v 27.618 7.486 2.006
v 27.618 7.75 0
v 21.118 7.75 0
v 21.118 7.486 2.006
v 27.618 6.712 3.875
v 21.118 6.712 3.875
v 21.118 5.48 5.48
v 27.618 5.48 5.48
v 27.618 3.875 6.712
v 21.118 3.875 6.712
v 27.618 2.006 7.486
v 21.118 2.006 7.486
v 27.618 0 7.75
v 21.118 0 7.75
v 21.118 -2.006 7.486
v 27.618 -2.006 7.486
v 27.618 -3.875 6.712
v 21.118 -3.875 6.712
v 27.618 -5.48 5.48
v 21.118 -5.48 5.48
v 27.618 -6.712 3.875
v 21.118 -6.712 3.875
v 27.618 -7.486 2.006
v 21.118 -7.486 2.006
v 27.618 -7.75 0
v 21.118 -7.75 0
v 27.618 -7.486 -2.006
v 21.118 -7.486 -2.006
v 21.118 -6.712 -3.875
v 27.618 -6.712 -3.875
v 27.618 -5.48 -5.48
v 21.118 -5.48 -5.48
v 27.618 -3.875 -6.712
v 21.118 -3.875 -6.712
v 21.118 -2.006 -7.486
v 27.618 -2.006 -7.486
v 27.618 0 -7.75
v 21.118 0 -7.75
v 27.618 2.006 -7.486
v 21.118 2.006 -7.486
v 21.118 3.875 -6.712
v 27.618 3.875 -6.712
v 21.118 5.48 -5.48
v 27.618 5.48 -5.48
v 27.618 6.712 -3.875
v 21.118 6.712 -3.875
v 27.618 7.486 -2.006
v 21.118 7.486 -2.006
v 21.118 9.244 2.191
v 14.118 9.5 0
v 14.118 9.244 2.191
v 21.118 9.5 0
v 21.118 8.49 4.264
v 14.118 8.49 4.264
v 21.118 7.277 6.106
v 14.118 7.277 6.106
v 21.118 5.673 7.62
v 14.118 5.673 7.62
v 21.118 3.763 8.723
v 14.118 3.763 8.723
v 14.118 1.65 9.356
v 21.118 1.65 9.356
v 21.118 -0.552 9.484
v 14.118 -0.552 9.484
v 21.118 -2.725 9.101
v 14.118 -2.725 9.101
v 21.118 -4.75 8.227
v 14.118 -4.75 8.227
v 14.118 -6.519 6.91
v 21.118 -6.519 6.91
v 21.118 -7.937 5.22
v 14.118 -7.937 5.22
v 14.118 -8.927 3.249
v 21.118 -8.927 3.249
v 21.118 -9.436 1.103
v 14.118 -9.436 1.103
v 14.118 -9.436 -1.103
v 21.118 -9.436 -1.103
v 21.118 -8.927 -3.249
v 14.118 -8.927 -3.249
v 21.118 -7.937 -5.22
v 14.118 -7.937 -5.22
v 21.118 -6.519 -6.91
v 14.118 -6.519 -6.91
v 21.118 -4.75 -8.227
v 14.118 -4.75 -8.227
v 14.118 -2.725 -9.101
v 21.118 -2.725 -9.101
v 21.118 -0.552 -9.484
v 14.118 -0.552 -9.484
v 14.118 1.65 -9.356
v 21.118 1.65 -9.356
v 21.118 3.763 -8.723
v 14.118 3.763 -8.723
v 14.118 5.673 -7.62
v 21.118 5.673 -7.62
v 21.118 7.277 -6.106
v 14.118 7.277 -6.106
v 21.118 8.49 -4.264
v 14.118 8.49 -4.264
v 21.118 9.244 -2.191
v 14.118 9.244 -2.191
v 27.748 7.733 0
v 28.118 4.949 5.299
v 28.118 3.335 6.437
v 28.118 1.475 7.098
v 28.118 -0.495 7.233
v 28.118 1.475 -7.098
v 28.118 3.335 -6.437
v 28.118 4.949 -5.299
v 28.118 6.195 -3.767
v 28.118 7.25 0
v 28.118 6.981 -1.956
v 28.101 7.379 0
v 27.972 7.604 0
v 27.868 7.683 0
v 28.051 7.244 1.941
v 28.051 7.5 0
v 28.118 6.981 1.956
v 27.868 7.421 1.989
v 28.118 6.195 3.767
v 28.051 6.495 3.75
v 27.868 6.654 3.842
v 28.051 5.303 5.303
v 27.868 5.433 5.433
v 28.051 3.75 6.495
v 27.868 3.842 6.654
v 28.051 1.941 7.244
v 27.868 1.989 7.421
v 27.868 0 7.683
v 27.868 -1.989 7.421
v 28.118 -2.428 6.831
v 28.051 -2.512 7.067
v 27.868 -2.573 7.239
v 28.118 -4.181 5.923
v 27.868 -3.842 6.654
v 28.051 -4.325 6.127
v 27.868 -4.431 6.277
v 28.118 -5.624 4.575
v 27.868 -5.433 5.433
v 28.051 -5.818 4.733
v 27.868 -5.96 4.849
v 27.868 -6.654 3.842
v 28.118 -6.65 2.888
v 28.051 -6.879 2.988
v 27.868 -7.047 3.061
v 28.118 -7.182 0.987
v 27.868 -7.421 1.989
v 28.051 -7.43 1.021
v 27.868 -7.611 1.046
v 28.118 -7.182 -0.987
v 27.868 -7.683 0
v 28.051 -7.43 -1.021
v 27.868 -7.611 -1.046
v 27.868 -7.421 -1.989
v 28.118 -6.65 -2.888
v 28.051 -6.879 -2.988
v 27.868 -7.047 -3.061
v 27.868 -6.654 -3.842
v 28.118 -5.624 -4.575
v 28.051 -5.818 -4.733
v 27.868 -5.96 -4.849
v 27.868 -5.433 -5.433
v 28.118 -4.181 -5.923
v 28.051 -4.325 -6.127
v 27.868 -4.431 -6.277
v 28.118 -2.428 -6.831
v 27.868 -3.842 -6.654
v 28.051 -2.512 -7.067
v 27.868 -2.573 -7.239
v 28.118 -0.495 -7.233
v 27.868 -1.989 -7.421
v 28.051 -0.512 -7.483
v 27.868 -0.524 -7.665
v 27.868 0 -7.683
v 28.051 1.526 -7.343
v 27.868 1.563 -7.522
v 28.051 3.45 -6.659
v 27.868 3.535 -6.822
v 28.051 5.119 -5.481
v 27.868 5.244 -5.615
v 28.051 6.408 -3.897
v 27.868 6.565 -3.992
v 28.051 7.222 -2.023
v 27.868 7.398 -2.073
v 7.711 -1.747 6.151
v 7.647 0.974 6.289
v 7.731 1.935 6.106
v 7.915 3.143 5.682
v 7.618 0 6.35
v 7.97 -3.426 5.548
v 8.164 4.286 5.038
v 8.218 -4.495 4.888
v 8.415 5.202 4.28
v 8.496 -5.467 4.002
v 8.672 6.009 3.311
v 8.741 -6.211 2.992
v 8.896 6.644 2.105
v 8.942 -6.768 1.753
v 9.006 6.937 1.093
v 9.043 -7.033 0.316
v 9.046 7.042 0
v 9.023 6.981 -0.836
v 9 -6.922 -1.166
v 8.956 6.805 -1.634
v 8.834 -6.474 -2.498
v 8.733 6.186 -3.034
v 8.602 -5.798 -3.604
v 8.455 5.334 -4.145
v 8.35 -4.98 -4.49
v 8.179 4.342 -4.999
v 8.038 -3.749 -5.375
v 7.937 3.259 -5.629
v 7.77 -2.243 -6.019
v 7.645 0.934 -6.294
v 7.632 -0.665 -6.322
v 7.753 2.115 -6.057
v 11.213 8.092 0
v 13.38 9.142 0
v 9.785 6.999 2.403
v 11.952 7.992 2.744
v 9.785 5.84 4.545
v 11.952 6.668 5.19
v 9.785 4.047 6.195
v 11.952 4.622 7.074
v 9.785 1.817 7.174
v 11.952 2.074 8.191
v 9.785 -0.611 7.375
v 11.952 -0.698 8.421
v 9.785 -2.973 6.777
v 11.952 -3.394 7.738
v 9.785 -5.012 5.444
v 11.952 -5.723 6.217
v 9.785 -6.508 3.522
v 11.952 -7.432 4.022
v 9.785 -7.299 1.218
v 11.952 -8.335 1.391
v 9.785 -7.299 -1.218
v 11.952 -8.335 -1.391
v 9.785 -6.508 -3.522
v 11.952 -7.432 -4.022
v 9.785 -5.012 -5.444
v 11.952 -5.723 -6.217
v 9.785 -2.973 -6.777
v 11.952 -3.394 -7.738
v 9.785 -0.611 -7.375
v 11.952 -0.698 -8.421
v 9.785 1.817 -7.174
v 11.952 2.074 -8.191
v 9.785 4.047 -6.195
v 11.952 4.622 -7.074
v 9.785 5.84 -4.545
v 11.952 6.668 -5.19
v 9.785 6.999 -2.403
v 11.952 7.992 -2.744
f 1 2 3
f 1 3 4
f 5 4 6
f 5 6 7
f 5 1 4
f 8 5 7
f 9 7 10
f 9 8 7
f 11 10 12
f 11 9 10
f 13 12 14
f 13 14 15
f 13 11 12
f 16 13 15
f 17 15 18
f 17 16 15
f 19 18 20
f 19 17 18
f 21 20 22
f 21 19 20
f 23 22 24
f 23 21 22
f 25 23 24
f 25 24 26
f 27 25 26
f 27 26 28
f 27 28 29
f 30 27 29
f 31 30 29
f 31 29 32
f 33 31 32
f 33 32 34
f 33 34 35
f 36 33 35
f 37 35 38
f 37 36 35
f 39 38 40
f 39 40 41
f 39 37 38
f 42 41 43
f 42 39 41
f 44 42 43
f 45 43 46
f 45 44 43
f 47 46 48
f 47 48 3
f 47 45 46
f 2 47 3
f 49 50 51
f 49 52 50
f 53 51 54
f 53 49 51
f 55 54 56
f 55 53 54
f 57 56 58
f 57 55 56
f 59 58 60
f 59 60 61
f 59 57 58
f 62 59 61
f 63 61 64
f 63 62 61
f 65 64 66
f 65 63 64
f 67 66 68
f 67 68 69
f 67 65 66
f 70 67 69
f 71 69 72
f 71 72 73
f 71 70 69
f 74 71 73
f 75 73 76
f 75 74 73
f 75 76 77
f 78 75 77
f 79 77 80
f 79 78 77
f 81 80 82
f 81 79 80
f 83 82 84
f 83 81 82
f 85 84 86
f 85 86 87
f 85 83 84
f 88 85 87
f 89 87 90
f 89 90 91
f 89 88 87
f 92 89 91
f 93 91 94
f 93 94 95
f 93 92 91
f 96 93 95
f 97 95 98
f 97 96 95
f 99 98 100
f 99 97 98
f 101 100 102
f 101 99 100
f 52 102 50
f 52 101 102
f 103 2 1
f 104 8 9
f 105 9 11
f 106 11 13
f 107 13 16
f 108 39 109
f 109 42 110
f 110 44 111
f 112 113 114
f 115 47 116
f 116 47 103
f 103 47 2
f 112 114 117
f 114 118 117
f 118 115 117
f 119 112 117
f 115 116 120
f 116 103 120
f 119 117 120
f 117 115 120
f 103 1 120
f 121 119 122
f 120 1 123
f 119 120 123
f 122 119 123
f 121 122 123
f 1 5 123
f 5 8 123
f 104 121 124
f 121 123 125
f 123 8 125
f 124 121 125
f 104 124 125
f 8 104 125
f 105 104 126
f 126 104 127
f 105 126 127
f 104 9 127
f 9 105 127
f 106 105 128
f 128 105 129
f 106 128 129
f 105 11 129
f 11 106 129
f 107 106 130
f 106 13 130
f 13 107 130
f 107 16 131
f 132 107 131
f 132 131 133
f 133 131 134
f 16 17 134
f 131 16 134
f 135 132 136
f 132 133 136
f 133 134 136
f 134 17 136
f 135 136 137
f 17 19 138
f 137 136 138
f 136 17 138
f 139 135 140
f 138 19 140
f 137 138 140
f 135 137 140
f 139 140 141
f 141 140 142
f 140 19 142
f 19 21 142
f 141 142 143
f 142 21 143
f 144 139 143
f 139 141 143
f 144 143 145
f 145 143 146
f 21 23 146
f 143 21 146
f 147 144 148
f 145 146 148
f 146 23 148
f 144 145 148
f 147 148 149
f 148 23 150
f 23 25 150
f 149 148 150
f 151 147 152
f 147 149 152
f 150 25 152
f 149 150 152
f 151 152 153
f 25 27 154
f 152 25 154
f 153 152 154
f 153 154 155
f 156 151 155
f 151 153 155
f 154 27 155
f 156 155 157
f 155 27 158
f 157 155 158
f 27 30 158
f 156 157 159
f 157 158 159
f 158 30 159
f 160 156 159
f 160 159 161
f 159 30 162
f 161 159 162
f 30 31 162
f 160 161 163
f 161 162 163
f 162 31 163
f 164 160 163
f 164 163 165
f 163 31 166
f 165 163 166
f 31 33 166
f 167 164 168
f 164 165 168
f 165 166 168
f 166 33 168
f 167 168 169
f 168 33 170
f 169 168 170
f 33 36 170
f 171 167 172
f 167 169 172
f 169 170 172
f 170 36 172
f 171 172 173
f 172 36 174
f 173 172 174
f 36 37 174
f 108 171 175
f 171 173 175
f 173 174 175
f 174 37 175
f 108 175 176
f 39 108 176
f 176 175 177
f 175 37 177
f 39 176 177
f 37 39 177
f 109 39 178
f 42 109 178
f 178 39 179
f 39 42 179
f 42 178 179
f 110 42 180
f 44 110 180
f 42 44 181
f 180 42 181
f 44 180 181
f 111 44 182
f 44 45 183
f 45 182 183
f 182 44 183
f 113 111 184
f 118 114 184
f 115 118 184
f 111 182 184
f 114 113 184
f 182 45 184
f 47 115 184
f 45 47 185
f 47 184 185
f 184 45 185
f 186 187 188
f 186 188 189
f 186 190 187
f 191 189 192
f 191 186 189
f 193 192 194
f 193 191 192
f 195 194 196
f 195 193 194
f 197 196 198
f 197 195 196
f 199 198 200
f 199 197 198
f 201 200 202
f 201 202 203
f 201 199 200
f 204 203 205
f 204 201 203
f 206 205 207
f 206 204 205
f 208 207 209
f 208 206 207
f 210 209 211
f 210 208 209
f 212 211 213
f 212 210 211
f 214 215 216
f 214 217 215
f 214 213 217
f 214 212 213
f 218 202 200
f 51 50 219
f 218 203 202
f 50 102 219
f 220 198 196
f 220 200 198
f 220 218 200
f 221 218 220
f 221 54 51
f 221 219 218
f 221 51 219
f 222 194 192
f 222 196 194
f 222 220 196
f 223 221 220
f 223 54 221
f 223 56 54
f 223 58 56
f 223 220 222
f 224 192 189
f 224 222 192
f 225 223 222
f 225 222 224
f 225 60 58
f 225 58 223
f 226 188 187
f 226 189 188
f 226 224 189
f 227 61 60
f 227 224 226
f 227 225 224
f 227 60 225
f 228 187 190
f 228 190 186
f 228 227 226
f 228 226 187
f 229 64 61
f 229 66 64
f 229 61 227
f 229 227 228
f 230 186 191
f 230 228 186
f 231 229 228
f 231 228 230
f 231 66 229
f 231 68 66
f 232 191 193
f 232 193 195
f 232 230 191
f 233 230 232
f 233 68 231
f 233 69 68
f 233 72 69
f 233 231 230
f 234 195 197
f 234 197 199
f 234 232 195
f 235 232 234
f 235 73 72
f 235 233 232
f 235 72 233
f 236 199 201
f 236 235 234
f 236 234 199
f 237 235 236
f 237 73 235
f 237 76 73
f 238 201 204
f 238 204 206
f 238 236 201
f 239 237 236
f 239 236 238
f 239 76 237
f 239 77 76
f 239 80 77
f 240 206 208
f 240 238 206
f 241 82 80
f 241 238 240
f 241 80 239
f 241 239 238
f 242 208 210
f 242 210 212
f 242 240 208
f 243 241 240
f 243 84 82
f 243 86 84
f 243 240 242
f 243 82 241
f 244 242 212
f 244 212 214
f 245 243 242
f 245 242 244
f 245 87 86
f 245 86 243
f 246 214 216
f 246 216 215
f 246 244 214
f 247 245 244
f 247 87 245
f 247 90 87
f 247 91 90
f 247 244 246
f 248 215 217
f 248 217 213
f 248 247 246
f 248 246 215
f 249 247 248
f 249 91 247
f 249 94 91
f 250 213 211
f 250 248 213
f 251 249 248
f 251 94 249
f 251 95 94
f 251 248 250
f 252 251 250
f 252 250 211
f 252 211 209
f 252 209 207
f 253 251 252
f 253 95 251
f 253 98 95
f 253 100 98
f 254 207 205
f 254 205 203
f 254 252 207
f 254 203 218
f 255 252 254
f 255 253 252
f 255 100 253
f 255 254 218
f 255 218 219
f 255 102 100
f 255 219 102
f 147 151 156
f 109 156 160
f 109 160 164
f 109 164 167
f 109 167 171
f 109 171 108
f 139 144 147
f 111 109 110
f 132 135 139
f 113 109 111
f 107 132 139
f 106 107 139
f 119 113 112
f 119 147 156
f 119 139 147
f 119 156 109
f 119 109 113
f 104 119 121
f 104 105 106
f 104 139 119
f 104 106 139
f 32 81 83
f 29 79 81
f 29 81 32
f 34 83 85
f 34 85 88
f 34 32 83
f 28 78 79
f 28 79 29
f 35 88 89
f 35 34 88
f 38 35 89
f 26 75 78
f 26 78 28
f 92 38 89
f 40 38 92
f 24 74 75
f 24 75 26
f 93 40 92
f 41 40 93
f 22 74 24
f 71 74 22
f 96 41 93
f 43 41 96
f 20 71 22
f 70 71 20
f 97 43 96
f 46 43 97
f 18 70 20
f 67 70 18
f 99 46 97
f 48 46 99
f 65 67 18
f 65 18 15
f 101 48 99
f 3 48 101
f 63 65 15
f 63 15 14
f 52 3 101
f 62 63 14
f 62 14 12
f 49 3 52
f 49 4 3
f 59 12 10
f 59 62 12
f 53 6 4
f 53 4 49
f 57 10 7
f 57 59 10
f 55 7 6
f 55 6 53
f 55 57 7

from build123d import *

# Parameters (mm, degrees)
CUT_EXTRUDE1_DEPTH      = 32.163141952
CUT_EXTRUDE1_DEPTH_BACK = 32.163141952
FILLET1_R               = 0.5


# Read off the part's stored shape, not the designer's step: Revolve2
with BuildPart() as part:
    # Revolve2 outline → Revolve2 (revolve)
    with BuildSketch(Plane.YX):
        Polygon((7.75, 28.118346614), (0, 28.118346614), (0, 7.618346614), (6.35, 7.618346614), (9.5, 14.118346614), (9.5, 21.118346614), (7.75, 21.118346614), align=None)
    revolve(axis=Axis((0, 0, 0), (1, 0, 0)))

    # Sketch3 → Cut-Extrude1 (cut, two sides: drawn at the far end of the back side and taken through both)
    with BuildSketch(Plane(origin=(0, 0, 0), x_dir=(1, 0, 0), z_dir=(0, 1, 0)).offset(-CUT_EXTRUDE1_DEPTH_BACK)):
        with BuildLine():
            Line((7.618346614, 6.35), (7.618346614, -6.35))
            ThreePointArc((7.618346614, -6.35), (9.046260231, 0), (7.618346614, 6.35))
        make_face()
    extrude(amount=CUT_EXTRUDE1_DEPTH + CUT_EXTRUDE1_DEPTH_BACK, mode=Mode.SUBTRACT)

    # Fillet1
    fillet1_edges = [part.edges().sort_by_distance(p)[0] for p in [
        (28.118346614, -7.75, 0),
    ]]
    fillet(fillet1_edges, radius=FILLET1_R)


solid = part.part
